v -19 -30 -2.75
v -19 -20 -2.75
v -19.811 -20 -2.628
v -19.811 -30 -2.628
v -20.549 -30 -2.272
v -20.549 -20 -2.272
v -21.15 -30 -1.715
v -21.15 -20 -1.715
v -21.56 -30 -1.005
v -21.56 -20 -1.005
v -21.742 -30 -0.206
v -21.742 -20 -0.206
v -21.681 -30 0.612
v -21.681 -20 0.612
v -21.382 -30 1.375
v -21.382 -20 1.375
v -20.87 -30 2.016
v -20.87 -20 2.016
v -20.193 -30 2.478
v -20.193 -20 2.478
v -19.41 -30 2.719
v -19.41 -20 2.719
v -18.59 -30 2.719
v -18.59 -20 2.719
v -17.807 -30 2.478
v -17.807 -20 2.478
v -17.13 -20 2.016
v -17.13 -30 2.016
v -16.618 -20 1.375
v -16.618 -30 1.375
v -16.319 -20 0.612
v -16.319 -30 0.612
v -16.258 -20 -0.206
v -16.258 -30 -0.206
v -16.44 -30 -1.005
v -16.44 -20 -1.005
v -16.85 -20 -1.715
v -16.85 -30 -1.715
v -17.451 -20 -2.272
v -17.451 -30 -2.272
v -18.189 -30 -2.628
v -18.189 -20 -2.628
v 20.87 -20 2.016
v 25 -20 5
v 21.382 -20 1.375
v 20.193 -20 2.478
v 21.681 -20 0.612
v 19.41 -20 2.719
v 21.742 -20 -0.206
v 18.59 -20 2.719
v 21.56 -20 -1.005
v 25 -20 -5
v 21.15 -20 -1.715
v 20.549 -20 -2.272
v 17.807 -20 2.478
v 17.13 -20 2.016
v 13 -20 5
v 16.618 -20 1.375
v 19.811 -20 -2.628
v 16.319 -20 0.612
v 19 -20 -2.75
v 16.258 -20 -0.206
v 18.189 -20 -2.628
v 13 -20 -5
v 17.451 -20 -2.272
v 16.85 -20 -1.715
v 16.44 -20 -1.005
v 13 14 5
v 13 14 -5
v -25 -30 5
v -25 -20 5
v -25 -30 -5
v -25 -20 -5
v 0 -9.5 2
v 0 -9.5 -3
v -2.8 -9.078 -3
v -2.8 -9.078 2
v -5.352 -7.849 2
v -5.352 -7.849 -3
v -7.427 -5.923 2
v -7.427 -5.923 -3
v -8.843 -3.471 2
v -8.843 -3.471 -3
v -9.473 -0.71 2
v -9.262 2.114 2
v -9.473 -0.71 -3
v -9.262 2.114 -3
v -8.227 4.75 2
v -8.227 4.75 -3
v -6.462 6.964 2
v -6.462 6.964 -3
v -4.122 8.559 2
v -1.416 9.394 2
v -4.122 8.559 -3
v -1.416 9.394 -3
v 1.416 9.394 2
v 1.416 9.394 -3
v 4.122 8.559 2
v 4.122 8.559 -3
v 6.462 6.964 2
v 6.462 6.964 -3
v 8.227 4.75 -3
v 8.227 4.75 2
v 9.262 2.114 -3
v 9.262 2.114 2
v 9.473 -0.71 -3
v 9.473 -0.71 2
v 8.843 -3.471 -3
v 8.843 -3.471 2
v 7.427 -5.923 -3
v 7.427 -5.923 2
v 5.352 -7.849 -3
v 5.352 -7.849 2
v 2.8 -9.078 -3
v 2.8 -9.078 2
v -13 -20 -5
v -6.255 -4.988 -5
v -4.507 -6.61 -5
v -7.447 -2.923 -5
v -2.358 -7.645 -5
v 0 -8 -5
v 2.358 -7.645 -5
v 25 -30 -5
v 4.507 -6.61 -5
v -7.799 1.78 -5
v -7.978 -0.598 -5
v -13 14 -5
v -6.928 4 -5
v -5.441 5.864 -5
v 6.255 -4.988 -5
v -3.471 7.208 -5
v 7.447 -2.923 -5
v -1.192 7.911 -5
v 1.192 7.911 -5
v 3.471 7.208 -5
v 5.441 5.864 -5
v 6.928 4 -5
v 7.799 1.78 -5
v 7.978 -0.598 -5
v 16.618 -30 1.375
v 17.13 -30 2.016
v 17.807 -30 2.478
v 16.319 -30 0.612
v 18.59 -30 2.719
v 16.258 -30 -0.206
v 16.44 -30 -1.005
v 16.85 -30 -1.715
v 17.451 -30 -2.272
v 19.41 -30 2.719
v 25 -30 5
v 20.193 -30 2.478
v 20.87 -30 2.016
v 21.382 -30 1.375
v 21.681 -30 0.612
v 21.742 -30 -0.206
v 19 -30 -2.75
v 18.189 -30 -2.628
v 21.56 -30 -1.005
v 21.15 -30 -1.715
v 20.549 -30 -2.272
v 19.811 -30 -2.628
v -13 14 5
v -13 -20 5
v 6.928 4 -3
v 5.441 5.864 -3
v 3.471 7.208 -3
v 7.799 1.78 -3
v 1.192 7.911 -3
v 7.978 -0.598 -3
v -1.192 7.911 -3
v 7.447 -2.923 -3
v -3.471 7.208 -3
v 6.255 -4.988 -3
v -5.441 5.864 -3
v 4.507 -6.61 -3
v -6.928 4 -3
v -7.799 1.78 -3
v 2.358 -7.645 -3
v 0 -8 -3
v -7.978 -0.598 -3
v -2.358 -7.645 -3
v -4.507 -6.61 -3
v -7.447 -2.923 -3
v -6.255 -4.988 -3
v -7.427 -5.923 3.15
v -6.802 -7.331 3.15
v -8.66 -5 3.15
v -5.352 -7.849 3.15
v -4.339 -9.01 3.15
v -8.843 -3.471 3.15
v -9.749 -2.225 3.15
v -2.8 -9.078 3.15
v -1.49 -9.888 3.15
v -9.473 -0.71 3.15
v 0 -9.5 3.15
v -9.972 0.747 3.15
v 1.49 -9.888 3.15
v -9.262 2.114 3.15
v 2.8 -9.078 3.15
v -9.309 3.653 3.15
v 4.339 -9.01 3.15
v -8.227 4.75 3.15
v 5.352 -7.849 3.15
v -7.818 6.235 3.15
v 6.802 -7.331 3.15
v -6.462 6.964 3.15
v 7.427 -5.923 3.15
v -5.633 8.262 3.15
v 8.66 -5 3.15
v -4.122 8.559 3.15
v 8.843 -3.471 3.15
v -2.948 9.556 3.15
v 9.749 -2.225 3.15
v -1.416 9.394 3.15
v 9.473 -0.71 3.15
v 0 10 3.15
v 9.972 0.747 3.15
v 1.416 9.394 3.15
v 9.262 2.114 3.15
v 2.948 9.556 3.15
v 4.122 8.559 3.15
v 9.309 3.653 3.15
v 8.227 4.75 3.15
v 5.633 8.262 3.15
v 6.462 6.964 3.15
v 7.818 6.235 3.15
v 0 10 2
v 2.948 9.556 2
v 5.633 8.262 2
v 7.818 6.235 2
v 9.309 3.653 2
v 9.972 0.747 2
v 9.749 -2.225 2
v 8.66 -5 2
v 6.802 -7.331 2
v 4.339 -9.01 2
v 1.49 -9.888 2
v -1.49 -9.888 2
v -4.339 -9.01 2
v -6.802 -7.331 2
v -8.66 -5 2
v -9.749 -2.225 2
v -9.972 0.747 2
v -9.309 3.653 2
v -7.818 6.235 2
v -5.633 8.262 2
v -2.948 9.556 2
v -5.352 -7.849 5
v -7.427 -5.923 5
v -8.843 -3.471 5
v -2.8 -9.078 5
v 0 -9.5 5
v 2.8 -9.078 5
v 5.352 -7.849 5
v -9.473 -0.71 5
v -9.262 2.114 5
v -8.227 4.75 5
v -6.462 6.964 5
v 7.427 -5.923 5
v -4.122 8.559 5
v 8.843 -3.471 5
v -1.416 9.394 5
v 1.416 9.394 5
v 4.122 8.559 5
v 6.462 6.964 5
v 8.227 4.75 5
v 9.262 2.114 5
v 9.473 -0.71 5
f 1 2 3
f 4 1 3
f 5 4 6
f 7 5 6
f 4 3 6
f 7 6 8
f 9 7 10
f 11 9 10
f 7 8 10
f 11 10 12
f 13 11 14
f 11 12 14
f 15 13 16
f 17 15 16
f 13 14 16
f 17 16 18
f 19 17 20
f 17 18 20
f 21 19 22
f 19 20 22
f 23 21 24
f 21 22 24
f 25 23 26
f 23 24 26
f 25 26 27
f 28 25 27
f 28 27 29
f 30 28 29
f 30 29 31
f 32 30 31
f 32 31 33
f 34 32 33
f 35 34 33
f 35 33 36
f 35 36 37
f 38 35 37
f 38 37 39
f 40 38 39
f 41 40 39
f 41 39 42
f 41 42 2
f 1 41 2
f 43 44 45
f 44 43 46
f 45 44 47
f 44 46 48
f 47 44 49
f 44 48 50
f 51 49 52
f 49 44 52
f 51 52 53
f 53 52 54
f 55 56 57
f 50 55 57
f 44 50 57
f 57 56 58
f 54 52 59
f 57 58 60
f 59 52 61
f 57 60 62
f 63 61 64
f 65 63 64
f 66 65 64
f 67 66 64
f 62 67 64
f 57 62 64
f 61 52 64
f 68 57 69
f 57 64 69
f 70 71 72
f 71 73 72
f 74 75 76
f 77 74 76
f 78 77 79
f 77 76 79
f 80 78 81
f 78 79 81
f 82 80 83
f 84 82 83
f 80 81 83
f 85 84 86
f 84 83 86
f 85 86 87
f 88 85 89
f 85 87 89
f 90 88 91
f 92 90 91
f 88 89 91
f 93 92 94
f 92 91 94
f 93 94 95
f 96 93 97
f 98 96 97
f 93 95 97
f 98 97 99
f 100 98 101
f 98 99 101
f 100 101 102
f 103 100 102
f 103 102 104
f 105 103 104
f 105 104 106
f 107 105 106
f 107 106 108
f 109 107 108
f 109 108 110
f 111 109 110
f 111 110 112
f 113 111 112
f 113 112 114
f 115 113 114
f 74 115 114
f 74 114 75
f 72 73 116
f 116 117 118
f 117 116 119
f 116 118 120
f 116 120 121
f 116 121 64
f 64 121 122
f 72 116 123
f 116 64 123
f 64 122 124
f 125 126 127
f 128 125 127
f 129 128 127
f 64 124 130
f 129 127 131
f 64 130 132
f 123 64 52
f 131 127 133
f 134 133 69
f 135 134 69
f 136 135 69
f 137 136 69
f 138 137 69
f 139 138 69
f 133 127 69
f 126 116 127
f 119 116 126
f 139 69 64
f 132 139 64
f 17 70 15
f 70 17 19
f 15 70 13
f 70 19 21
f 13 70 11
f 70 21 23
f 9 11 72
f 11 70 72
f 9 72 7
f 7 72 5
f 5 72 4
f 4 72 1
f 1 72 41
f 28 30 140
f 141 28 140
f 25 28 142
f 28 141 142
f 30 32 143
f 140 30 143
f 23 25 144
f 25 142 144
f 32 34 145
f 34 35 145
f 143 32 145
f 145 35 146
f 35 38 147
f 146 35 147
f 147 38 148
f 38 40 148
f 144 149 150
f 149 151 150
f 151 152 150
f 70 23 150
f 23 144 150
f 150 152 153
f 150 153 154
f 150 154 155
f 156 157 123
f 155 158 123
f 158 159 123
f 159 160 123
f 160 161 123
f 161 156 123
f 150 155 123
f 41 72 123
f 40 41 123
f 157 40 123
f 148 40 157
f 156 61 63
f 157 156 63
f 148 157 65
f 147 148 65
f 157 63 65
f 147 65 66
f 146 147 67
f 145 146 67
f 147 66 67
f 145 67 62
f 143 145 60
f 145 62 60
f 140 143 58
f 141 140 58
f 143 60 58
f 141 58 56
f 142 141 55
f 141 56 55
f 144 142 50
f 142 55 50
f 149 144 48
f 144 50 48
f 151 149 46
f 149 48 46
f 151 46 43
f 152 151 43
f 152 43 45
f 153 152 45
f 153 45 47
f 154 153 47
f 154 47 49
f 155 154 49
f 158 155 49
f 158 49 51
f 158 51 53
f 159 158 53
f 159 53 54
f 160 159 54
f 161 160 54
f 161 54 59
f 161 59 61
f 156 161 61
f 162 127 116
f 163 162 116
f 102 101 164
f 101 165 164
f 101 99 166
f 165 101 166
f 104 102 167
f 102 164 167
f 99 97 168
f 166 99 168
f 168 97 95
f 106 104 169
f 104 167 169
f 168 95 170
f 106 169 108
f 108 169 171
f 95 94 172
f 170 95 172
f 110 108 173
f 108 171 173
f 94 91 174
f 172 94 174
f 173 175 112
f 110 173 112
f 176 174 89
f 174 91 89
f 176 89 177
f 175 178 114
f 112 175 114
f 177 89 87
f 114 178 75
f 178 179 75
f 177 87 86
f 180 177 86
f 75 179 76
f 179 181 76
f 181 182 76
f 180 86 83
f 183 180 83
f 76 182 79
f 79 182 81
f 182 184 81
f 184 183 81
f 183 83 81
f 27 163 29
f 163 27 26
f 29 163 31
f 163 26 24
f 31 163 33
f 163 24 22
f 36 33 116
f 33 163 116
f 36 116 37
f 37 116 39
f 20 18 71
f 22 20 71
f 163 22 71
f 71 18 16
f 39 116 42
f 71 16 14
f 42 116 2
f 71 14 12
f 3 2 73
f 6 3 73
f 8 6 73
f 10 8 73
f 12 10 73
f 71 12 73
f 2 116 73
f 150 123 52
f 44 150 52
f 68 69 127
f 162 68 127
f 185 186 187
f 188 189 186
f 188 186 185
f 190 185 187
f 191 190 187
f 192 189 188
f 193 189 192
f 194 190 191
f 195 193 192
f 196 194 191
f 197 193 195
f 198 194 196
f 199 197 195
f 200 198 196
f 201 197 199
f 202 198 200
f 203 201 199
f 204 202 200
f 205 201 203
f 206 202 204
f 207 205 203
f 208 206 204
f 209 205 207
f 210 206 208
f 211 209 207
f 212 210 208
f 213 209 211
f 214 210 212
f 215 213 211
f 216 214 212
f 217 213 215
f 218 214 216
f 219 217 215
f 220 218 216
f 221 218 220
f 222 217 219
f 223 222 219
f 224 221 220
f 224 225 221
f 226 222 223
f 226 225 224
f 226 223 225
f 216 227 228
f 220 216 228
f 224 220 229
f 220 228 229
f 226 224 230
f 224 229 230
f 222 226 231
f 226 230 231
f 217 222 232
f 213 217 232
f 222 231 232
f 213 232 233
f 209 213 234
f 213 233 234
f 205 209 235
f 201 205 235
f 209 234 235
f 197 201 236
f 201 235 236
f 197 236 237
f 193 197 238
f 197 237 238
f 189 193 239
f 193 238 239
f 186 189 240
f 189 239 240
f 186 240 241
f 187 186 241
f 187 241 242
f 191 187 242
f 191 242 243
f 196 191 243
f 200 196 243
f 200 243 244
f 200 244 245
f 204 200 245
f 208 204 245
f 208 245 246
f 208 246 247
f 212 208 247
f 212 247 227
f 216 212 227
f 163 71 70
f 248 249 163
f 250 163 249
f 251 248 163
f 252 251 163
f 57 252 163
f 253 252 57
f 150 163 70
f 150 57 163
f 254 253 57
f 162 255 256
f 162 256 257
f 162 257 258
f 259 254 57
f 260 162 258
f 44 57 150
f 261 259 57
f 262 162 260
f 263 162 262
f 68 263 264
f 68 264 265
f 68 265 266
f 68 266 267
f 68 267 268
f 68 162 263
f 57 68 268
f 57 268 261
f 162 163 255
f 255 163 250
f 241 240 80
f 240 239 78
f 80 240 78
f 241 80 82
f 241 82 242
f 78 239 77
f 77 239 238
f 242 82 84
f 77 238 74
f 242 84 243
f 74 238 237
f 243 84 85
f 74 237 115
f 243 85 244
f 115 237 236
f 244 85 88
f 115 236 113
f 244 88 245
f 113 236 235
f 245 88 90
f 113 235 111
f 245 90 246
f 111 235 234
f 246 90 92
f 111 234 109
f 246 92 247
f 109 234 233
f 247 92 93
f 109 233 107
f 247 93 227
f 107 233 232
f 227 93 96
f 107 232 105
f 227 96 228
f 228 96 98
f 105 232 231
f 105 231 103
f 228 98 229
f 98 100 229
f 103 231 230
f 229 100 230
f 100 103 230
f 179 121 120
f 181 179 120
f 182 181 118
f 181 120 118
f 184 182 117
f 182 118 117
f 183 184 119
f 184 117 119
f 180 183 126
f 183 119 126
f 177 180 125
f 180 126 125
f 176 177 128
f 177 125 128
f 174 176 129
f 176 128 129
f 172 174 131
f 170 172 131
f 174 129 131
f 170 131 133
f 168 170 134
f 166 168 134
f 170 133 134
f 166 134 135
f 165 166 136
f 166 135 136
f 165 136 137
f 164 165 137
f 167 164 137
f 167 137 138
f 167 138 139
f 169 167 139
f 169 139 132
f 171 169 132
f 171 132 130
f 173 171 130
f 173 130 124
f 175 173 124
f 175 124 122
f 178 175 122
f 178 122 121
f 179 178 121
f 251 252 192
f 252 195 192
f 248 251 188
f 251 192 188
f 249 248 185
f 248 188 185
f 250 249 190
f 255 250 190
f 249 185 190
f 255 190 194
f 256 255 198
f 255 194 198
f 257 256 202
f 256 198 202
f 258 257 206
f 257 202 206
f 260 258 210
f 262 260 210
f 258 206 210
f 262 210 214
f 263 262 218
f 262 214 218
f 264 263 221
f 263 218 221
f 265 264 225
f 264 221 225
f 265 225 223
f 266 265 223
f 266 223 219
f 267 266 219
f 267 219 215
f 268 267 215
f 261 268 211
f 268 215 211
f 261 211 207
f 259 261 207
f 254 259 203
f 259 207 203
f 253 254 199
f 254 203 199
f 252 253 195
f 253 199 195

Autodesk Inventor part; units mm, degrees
sketch "Sketch_1" plane through (0, 0, 0) normal (0, 0, 1) x (1, 0, 0)
  line L0 (-25, -20) -> (-25, -30)
  line L1 (-25, -30) -> (25, -30)
  line L2 (25, -30) -> (25, -20)
  line L3 (25, -20) -> (13, -20)
  line L4 (13, -20) -> (13, 14)
  line L5 (13, 14) -> (-13, 14)
  line L6 (-13, 14) -> (-13, -20)
  line L7 (-13, -20) -> (-25, -20)
extrude "Extrusion1" add sketch "Sketch_1" along normal mid plane 10
sketch "Sketch2" plane through (0, 0, 5) normal (0, 0, 1) x (1, 0, 0)
  point P0 (0, 0)
hole "Hole1" at (0, 0, 5) direction (0, 0, -1) diameter 16 depth 10 counterbore diameter 19 counterbore depth 8
sketch "Sketch3" plane through (-25, -30, 5) normal (0, -1, 0) x (1, 0, 0)
  point P0 (6, -5)
hole "Hole2" at (-19, -30, 0) direction (0, 1, 0) diameter 5.5 depth 10
sketch "Sketch4" plane through (-25, -30, 5) normal (0, -1, 0) x (1, 0, 0)
  point P0 (44, -5)
hole "Hole3" at (19, -30, 0) direction (0, 1, 0) diameter 5.5 depth 10
sketch "Sketch_4" plane through (0, 0, 0) normal (1, 0, 0) x (0, 0, -1)
  line L0 (-2, 0) -> (-3.15, 0)
  line L1 (-3.15, 0) -> (-3.15, 10)
  line L2 (-3.15, 10) -> (-2, 10)
  line L3 (-2, 10) -> (-2, 0)
  line L4 (-2, 0) -> (-3.15, 0)
revolve "Revolution1" cut sketch "Sketch_4" angle 360 about axis through (0, 0, 2) along (0, 0, -1)
ref_plane "housing_to_dummy_XY" through (0, 0, 0) normal (1, 0, 0) x (0, 0, -1)
ref_plane "housing_to_dummy_YZ" through (0, 0, 0) normal (0, 0, -1) x (0, 1, 0)
ref_plane "housing_to_dummy_ZX" through (0, 0, 0) normal (0, 1, 0) x (1, 0, 0)
ref_plane "to_bearing_XY" through (0, 0, -3) normal (0, 0, -1) x (1, 0, 0)
ref_plane "to_bearing_YZ" through (0, 0, -3) normal (1, 0, 0) x (0, -1, 0)
ref_plane "to_bearing_ZX" through (0, 0, -3) normal (0, -1, 0) x (0, 0, -1)
ref_plane "to_rring_XY" through (0, 0, 2) normal (0, 0, -1) x (1, 0, 0)
ref_plane "to_rring_YZ" through (0, 0, 2) normal (1, 0, 0) x (0, -1, 0)
ref_plane "to_rring_ZX" through (0, 0, 2) normal (0, -1, 0) x (0, 0, -1)
properties part number "BGHK6800VV-30_h"
